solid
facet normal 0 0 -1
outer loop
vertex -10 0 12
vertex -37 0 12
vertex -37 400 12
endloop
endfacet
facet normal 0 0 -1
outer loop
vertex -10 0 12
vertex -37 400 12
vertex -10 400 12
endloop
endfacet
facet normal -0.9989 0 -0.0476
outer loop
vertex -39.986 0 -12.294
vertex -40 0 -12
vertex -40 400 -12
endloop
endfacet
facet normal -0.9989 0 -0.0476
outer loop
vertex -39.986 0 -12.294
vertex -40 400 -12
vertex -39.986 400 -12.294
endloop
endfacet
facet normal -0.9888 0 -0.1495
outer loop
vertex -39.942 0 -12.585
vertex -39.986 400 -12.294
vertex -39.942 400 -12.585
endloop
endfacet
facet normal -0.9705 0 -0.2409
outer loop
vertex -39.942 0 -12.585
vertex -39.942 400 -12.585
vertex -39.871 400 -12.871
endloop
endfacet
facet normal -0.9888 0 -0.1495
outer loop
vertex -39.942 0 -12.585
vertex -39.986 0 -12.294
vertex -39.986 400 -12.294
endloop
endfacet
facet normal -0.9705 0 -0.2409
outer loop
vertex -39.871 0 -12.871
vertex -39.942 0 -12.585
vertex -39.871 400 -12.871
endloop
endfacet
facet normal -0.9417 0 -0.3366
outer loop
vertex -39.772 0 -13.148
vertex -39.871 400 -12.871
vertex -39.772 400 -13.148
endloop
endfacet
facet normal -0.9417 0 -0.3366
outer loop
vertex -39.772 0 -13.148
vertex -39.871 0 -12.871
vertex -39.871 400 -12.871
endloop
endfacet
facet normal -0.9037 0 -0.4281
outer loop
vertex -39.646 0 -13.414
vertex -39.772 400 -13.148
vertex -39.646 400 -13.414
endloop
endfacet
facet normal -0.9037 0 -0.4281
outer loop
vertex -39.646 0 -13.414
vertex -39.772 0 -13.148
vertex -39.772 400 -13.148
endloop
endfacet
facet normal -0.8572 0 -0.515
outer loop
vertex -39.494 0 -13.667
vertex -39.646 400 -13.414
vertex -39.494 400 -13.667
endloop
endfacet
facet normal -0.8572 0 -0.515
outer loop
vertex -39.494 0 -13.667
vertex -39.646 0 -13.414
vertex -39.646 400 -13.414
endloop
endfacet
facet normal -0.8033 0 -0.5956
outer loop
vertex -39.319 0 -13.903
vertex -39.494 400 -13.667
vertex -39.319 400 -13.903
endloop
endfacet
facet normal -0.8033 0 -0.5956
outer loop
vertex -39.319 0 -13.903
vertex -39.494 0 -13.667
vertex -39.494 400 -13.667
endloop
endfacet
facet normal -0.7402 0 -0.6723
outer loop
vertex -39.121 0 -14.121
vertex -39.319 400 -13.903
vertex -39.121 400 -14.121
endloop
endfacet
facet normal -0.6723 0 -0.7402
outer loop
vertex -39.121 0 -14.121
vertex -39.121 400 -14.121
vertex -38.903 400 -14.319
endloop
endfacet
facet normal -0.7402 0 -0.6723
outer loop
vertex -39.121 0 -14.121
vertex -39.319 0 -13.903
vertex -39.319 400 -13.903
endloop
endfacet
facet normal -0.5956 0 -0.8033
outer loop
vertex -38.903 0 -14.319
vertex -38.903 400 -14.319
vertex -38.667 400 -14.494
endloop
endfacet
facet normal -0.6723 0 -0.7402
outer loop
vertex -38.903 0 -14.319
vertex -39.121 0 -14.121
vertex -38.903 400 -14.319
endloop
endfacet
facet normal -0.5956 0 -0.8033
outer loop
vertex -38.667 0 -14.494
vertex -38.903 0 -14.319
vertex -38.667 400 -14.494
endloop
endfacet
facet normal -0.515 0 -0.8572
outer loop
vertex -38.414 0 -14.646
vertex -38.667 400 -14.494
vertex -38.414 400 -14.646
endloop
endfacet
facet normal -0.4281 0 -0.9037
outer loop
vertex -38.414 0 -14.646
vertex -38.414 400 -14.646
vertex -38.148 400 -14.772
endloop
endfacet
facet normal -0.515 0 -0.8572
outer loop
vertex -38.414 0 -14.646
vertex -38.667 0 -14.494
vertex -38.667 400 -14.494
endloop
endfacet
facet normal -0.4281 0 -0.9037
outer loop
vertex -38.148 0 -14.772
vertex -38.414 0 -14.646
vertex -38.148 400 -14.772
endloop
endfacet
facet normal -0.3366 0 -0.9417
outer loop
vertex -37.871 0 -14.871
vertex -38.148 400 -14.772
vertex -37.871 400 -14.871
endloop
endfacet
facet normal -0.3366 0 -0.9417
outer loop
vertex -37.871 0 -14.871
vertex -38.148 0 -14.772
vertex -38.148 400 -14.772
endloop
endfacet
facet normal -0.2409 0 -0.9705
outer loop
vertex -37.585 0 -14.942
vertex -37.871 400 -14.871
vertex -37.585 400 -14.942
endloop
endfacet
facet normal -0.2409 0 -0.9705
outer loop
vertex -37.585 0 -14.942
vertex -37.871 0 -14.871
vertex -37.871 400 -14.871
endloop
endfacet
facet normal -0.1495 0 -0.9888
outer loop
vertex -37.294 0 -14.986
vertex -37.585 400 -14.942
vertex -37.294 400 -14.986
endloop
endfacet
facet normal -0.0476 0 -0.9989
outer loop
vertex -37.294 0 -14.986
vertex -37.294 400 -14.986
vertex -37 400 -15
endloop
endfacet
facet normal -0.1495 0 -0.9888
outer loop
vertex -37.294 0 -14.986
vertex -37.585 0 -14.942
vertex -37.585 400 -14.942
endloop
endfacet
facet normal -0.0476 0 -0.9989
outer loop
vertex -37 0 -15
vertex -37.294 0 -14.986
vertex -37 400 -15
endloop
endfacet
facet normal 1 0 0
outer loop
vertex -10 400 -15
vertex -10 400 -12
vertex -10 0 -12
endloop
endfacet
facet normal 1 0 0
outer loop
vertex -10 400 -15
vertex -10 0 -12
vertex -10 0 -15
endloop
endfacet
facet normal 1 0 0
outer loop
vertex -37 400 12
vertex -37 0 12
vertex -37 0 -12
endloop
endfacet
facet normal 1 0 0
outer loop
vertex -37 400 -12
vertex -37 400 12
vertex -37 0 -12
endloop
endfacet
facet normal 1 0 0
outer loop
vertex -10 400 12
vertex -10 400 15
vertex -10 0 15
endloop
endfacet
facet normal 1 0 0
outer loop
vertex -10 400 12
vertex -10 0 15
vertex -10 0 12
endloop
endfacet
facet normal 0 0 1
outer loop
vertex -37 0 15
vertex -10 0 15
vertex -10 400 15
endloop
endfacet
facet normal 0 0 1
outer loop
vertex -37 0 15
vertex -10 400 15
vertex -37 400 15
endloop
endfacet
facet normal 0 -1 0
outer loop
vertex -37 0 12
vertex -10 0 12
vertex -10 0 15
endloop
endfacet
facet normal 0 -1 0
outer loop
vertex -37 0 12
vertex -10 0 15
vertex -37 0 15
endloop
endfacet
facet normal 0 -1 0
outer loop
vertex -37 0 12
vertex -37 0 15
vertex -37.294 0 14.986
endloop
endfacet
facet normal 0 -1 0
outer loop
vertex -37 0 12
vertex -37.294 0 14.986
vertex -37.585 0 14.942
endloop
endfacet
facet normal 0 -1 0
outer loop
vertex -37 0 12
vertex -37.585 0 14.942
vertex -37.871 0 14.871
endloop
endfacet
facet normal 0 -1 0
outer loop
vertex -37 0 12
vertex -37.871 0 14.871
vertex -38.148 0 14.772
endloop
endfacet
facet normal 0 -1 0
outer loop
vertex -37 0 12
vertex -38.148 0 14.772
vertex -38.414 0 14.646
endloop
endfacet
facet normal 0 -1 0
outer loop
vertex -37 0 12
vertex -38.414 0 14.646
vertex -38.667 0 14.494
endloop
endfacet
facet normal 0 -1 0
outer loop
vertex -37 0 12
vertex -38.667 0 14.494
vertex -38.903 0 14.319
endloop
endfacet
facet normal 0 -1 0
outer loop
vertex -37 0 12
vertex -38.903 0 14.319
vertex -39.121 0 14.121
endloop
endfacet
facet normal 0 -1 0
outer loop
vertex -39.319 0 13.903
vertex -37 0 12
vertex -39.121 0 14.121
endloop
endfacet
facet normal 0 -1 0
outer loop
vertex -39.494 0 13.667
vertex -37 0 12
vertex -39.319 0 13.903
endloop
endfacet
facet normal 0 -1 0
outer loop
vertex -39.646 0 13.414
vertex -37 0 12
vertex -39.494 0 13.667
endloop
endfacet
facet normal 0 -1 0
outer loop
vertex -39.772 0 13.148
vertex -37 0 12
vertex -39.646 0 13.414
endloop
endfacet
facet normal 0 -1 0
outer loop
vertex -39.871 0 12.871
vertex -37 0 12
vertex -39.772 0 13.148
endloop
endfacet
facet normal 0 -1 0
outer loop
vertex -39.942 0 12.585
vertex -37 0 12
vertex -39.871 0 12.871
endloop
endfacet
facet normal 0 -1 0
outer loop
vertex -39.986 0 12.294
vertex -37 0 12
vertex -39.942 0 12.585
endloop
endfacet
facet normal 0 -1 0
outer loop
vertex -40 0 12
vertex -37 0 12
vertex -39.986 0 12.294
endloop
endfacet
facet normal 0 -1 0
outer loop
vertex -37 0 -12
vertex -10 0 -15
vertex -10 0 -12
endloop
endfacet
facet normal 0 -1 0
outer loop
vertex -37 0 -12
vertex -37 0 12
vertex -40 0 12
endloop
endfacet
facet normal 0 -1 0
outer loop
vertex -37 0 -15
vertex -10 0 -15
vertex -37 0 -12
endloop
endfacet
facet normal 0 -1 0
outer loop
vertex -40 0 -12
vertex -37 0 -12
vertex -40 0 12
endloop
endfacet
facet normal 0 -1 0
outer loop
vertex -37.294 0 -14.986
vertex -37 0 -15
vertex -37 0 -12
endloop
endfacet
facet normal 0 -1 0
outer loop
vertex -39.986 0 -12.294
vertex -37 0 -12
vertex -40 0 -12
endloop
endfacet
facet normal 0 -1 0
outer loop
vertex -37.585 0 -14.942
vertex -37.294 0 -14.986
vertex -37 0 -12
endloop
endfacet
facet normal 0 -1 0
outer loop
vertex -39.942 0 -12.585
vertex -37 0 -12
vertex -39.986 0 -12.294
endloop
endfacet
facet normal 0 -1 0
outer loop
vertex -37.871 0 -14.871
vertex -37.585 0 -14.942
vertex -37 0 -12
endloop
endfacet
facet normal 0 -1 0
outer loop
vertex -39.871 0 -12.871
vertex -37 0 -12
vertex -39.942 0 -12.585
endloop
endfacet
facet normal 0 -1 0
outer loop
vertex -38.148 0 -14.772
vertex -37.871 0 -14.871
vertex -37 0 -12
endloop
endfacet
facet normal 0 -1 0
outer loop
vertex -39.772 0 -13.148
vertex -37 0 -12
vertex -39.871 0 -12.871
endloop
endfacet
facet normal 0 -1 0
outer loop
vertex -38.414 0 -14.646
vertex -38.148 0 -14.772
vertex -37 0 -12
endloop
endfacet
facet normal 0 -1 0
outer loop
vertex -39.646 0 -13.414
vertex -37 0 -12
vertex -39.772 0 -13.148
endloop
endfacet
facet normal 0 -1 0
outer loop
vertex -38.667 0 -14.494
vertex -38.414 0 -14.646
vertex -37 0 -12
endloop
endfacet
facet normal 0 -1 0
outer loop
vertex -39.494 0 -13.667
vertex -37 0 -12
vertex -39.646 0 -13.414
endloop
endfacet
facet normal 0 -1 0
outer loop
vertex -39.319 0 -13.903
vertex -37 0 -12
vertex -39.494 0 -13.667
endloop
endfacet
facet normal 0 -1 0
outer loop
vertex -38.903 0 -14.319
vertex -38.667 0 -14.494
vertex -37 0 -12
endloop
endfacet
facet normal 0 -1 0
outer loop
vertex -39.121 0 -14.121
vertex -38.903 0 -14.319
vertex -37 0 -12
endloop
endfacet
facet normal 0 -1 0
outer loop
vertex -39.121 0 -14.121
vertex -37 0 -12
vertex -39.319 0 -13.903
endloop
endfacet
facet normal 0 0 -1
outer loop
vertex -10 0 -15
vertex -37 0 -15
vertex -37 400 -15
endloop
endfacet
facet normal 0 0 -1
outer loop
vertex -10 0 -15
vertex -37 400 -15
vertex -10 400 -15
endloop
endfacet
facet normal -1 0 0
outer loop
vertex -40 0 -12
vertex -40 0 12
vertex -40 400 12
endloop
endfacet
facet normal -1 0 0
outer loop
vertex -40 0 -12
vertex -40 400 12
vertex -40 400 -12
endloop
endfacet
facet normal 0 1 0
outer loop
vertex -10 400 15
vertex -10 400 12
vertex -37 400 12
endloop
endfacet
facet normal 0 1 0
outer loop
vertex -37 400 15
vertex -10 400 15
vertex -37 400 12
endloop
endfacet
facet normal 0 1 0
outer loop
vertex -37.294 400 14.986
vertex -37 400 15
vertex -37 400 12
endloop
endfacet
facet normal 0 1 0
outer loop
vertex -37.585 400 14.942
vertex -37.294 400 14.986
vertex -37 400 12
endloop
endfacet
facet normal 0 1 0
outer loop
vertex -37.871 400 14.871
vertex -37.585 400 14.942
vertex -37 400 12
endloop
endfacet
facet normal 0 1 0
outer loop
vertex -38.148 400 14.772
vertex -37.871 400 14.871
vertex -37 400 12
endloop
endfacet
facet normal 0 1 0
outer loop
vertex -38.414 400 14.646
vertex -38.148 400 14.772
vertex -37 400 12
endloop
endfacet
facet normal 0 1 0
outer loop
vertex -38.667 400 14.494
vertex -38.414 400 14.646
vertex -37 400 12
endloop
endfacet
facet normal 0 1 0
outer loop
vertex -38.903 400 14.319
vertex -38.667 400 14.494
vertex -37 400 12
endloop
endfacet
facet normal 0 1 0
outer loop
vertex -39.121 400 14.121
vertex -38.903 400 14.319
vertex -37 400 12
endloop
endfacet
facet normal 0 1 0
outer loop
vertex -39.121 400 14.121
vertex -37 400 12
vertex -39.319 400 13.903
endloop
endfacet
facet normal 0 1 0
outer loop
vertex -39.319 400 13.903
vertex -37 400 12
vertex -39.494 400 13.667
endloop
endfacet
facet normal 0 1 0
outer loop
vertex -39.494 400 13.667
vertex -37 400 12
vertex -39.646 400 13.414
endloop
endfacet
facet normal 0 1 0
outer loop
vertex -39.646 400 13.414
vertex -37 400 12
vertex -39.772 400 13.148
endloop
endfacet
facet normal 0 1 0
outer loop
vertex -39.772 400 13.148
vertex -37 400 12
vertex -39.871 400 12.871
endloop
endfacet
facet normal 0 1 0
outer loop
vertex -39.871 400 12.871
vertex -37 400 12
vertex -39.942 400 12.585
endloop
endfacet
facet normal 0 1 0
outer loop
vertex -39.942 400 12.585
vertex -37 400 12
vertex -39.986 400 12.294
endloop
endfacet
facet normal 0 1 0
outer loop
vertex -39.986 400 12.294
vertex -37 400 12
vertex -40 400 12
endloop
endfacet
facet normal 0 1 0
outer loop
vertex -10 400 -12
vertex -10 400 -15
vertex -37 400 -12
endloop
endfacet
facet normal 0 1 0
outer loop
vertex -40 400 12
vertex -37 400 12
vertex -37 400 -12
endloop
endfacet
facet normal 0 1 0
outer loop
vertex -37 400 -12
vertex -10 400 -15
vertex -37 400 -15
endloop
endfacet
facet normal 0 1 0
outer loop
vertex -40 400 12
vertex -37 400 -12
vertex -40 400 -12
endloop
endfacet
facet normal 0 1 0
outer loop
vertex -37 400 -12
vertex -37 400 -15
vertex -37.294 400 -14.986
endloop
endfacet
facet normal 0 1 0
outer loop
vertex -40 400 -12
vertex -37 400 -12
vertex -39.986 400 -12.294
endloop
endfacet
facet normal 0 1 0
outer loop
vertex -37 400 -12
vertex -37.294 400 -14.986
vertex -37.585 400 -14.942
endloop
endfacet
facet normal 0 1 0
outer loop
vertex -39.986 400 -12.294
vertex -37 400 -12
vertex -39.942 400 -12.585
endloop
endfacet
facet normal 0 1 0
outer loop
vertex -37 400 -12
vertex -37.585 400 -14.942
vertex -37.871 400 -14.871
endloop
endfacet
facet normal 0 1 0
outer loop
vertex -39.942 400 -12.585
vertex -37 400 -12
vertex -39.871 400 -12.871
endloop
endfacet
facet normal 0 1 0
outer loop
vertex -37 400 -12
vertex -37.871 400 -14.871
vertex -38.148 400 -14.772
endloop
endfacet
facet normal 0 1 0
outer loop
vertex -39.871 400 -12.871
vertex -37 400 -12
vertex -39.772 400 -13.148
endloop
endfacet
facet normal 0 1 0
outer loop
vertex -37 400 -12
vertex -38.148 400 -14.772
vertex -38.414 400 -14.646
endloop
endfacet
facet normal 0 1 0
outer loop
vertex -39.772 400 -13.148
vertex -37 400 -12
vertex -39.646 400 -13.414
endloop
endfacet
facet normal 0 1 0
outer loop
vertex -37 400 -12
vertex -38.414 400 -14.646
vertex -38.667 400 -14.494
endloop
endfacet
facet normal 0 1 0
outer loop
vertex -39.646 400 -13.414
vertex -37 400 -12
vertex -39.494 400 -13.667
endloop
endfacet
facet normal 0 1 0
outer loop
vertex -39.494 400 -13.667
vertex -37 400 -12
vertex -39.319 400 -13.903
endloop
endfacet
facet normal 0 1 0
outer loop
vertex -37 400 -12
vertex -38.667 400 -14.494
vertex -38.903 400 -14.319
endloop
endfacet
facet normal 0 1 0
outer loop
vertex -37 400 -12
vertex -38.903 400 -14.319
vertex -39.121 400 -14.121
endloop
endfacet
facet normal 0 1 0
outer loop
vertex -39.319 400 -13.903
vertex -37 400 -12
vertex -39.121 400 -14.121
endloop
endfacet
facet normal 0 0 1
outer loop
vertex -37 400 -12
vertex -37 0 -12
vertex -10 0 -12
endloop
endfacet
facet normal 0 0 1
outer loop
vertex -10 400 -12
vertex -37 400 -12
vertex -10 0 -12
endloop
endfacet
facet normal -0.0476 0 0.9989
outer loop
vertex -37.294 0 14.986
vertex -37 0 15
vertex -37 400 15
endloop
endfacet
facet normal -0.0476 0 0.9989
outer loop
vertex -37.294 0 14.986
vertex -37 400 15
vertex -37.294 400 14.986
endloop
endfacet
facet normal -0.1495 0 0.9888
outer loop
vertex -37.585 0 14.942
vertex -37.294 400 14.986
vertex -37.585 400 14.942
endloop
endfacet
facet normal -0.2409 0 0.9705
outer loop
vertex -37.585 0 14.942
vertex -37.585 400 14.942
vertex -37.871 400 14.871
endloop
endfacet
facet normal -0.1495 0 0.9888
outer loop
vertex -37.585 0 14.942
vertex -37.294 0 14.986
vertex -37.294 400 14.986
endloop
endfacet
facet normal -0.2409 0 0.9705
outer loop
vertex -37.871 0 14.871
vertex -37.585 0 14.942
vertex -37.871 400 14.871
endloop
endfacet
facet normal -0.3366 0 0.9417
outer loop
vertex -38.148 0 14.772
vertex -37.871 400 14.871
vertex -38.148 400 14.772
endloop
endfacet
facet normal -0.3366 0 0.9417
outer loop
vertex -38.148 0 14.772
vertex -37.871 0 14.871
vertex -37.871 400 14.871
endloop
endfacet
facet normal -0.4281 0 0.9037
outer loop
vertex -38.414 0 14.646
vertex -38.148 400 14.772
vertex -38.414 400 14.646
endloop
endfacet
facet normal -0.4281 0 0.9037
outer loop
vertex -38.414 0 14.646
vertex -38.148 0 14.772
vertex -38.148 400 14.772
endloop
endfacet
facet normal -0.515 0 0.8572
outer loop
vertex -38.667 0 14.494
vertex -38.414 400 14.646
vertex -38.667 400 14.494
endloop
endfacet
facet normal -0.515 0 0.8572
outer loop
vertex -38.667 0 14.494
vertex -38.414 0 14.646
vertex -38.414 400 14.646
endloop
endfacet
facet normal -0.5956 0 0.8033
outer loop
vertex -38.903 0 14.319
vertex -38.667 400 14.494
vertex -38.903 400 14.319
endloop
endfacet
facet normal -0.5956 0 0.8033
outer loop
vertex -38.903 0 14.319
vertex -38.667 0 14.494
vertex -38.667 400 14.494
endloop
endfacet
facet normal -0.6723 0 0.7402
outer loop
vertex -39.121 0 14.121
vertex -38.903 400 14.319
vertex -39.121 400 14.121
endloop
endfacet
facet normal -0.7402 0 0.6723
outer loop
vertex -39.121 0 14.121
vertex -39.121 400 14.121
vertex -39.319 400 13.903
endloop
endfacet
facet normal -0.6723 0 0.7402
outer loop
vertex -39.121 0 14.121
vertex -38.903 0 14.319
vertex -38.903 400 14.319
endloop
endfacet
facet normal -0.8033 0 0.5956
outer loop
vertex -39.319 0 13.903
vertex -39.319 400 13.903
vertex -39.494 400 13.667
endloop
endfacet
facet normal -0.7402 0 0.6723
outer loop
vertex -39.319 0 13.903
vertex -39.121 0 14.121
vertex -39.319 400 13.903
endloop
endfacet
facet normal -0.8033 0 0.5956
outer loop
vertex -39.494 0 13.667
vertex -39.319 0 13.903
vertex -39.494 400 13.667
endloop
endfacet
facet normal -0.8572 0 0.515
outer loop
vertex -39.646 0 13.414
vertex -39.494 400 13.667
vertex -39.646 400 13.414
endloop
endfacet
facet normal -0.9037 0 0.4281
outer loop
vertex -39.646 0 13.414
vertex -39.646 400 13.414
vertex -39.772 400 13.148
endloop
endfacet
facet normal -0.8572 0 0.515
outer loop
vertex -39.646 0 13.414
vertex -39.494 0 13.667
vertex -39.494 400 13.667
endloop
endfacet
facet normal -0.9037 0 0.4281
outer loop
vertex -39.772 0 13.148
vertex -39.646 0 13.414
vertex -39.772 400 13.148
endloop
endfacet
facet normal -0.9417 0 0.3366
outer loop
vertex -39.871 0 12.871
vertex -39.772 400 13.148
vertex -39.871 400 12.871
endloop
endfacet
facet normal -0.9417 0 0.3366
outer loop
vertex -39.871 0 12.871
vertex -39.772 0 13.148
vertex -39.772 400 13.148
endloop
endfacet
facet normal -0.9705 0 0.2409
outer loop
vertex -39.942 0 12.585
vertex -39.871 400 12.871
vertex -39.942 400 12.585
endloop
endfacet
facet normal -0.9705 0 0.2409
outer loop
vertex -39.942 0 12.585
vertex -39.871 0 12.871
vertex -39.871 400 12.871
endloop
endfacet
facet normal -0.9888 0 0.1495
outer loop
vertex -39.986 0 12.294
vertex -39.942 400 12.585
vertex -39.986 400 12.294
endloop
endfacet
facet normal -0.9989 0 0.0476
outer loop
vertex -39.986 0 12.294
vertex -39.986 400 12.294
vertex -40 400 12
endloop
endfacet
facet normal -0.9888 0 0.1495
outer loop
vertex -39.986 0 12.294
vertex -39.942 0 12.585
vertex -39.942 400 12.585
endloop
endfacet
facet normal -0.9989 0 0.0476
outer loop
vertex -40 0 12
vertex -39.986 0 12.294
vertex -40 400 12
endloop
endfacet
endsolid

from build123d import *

# Parameters (mm, degrees)
SKETCH_1_W          = 74
SKETCH_1_H          = 24
EXTRUDE_1_DEPTH     = 400
SKETCH_2_W          = 51.146480438
SKETCH_2_H          = 44.035025014
CUT_EXTRUDE_1_DEPTH = 401


with BuildPart() as part:
    # Эскиз1 → Вытянуть-Тонкостенный1 (new body)
    with BuildSketch(Plane(origin=(0, 0, 0), x_dir=(1, 0, 0), z_dir=(0, 1, 0))):
        with BuildLine():
            Line((40, 12), (40, -12))
            ThreePointArc((40, -12), (39.121320344, -14.121320344), (37, -15))
            Line((37, -15), (-37, -15))
            ThreePointArc((-37, -15), (-39.121320344, -14.121320344), (-40, -12))
            Line((-40, -12), (-40, 12))
            ThreePointArc((-40, 12), (-39.121320344, 14.121320344), (-37, 15))
            Line((-37, 15), (37, 15))
            ThreePointArc((37, 15), (39.121320344, 14.121320344), (40, 12))
        make_face()
        Rectangle(SKETCH_1_W, SKETCH_1_H, mode=Mode.SUBTRACT)
    extrude(amount=EXTRUDE_1_DEPTH)

    # Эскиз2 → Вырез-Вытянуть1 (cut, through all)
    with BuildSketch(Plane(origin=(0, 400, 0), x_dir=(1, 0, 0), z_dir=(0, 1, 0))):
        with Locations((15.573240219, -1.044738789)):
            Rectangle(SKETCH_2_W, SKETCH_2_H)
    extrude(amount=-CUT_EXTRUDE_1_DEPTH, mode=Mode.SUBTRACT)


solid = part.part
